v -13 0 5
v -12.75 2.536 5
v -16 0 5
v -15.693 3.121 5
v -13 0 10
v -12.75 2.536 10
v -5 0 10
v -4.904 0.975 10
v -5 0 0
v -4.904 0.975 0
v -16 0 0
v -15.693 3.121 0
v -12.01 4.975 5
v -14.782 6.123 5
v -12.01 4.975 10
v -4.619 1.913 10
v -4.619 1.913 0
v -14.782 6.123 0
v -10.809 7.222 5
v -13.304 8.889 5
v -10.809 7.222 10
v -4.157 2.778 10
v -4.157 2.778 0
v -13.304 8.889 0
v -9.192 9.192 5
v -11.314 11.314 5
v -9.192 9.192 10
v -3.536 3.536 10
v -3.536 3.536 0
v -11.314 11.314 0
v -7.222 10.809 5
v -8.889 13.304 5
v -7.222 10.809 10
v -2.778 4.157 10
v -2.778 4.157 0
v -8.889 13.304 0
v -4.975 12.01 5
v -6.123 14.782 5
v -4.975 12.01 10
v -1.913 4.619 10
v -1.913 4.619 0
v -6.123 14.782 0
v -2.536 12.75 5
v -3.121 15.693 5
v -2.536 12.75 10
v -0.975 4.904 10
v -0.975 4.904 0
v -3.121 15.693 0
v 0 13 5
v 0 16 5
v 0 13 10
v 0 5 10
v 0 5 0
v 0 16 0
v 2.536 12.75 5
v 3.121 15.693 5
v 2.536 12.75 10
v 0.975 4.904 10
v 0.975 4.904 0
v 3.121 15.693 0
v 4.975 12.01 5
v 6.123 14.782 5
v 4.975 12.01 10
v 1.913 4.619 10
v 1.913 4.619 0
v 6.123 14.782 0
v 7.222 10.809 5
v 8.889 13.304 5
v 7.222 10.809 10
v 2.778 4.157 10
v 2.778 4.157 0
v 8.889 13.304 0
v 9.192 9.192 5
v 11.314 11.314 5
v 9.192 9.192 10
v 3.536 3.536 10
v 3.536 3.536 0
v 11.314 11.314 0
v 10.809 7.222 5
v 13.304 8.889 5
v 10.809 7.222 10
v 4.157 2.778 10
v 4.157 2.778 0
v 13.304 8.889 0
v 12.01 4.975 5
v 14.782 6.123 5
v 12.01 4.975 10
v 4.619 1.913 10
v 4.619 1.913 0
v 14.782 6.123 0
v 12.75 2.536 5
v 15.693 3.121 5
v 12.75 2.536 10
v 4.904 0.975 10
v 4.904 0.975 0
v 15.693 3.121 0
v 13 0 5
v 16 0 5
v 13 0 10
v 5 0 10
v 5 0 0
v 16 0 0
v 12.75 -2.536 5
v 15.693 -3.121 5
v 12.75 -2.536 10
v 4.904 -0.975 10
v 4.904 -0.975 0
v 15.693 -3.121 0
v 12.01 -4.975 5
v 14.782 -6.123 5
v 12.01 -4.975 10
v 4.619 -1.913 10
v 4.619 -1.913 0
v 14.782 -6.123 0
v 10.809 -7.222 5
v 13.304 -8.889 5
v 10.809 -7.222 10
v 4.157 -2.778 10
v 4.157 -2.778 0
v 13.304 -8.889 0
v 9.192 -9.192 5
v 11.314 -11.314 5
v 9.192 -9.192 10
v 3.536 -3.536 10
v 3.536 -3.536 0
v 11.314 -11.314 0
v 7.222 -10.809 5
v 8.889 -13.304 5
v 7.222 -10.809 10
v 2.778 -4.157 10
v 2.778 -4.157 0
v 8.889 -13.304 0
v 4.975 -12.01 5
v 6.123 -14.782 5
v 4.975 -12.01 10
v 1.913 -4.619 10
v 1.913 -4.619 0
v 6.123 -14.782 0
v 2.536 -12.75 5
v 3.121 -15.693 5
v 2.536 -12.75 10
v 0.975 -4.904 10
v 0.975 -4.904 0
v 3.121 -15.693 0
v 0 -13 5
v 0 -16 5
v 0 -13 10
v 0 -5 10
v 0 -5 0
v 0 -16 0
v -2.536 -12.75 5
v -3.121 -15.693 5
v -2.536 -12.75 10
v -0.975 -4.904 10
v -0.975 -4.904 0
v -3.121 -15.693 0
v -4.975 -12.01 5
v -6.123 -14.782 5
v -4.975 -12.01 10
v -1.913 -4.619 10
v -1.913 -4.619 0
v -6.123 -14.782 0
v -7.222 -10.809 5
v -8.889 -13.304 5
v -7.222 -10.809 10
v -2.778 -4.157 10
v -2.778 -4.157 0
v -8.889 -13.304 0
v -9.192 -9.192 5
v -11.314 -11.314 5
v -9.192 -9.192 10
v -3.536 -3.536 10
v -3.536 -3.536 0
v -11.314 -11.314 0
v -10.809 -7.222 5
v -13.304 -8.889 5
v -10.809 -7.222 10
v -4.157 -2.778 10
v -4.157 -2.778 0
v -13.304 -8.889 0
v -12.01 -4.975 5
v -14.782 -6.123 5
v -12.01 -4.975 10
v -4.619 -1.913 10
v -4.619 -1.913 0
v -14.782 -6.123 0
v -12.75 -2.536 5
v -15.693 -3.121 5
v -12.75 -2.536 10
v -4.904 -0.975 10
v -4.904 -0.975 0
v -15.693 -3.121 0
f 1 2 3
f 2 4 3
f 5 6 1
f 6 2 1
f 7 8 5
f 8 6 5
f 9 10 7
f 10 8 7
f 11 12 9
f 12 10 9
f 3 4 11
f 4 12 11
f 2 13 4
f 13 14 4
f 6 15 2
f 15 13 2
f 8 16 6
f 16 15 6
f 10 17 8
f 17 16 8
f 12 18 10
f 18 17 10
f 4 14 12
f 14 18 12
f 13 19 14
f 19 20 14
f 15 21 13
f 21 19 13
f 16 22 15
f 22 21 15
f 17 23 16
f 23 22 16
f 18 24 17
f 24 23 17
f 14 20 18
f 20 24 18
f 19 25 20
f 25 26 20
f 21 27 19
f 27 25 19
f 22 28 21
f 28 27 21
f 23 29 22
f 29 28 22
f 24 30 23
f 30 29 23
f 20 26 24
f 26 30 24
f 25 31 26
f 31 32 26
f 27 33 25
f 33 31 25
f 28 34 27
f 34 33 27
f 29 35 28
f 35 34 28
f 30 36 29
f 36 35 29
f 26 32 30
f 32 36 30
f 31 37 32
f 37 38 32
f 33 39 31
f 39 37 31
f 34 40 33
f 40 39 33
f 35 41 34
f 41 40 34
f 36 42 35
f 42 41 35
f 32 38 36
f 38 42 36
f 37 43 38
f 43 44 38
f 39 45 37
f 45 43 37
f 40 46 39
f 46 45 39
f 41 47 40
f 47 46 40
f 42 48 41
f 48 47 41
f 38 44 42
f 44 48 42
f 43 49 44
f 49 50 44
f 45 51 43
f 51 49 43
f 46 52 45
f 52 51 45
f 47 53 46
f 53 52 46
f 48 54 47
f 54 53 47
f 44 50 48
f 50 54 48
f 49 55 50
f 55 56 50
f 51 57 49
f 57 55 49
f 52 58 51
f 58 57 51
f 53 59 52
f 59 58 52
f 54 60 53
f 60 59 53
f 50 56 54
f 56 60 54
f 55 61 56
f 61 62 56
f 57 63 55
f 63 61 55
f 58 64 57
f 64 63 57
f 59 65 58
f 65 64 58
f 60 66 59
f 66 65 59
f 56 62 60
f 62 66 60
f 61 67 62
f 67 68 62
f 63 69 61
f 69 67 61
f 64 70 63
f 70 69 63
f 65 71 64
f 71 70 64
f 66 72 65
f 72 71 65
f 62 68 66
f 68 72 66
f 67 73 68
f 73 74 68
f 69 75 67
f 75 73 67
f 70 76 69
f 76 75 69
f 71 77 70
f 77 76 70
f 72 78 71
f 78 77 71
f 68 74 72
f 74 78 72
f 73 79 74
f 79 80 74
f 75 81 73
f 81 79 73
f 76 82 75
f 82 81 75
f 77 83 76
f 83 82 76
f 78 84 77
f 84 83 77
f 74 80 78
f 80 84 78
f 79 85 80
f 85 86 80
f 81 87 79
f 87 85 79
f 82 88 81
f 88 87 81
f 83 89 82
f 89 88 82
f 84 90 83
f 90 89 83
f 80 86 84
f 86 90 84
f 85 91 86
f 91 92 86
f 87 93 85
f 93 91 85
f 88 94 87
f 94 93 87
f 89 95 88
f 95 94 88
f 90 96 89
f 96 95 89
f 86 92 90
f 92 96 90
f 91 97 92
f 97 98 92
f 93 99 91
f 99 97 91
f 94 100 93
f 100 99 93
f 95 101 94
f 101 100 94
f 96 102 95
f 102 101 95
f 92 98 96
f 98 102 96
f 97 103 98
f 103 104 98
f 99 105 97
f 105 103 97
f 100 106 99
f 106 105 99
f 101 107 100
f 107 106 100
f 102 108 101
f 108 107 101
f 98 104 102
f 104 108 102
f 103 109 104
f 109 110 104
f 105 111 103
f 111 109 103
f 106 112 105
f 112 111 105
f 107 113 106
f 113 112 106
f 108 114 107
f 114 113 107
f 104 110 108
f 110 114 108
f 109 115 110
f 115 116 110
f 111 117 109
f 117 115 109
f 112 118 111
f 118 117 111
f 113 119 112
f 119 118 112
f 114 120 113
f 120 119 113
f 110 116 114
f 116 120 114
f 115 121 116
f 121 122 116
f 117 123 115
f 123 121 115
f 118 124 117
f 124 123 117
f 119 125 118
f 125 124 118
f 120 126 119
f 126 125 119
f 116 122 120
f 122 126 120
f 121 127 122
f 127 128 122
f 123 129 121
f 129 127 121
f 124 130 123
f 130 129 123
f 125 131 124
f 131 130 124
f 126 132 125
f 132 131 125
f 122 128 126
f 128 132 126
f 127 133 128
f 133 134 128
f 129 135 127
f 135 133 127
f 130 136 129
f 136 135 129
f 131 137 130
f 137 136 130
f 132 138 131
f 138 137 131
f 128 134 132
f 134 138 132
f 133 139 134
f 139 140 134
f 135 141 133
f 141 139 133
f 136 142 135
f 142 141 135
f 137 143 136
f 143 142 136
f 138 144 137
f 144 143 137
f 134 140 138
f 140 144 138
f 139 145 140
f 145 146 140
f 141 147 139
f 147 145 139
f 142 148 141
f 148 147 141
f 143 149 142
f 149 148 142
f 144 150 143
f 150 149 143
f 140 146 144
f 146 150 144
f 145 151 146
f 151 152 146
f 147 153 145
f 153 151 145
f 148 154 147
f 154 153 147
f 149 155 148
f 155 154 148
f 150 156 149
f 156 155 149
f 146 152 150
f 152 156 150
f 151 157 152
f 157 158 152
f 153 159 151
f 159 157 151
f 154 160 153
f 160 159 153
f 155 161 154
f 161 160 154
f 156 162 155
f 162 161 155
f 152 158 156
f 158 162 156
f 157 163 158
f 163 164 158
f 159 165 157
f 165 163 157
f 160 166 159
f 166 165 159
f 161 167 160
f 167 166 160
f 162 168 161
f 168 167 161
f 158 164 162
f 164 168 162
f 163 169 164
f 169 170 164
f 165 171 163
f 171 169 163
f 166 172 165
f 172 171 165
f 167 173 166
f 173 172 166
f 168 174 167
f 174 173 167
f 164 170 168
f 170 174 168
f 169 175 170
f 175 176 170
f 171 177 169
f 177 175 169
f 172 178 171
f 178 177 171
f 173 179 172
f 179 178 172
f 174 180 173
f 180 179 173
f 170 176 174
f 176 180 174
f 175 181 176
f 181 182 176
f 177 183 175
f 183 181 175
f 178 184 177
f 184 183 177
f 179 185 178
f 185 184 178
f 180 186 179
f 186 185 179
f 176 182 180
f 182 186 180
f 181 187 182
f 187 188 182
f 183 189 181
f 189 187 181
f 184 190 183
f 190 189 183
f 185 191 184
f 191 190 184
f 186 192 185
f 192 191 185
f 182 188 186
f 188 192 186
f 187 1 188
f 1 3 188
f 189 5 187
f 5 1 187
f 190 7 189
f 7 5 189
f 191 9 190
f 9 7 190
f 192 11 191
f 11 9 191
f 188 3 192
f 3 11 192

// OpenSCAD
$fn = 32;

// ----------------------------------------------------------------------
// Arc stop: collar, 10 mm thick
// ----------------------------------------------------------------------

// --- parameters (mm) ---
revolve_angle = 360;      // full turn around the Z axis
profile_points = 6;       // points of the closed outline

profile = [[5, 0], [16, 0], [16, 5], [13, 5], [13, 10], [5, 10]];  // single closed polygon, 6 points, counter clockwise

// --- the one profile operation ---
rotate_extrude(angle = revolve_angle) polygon(points = profile);
